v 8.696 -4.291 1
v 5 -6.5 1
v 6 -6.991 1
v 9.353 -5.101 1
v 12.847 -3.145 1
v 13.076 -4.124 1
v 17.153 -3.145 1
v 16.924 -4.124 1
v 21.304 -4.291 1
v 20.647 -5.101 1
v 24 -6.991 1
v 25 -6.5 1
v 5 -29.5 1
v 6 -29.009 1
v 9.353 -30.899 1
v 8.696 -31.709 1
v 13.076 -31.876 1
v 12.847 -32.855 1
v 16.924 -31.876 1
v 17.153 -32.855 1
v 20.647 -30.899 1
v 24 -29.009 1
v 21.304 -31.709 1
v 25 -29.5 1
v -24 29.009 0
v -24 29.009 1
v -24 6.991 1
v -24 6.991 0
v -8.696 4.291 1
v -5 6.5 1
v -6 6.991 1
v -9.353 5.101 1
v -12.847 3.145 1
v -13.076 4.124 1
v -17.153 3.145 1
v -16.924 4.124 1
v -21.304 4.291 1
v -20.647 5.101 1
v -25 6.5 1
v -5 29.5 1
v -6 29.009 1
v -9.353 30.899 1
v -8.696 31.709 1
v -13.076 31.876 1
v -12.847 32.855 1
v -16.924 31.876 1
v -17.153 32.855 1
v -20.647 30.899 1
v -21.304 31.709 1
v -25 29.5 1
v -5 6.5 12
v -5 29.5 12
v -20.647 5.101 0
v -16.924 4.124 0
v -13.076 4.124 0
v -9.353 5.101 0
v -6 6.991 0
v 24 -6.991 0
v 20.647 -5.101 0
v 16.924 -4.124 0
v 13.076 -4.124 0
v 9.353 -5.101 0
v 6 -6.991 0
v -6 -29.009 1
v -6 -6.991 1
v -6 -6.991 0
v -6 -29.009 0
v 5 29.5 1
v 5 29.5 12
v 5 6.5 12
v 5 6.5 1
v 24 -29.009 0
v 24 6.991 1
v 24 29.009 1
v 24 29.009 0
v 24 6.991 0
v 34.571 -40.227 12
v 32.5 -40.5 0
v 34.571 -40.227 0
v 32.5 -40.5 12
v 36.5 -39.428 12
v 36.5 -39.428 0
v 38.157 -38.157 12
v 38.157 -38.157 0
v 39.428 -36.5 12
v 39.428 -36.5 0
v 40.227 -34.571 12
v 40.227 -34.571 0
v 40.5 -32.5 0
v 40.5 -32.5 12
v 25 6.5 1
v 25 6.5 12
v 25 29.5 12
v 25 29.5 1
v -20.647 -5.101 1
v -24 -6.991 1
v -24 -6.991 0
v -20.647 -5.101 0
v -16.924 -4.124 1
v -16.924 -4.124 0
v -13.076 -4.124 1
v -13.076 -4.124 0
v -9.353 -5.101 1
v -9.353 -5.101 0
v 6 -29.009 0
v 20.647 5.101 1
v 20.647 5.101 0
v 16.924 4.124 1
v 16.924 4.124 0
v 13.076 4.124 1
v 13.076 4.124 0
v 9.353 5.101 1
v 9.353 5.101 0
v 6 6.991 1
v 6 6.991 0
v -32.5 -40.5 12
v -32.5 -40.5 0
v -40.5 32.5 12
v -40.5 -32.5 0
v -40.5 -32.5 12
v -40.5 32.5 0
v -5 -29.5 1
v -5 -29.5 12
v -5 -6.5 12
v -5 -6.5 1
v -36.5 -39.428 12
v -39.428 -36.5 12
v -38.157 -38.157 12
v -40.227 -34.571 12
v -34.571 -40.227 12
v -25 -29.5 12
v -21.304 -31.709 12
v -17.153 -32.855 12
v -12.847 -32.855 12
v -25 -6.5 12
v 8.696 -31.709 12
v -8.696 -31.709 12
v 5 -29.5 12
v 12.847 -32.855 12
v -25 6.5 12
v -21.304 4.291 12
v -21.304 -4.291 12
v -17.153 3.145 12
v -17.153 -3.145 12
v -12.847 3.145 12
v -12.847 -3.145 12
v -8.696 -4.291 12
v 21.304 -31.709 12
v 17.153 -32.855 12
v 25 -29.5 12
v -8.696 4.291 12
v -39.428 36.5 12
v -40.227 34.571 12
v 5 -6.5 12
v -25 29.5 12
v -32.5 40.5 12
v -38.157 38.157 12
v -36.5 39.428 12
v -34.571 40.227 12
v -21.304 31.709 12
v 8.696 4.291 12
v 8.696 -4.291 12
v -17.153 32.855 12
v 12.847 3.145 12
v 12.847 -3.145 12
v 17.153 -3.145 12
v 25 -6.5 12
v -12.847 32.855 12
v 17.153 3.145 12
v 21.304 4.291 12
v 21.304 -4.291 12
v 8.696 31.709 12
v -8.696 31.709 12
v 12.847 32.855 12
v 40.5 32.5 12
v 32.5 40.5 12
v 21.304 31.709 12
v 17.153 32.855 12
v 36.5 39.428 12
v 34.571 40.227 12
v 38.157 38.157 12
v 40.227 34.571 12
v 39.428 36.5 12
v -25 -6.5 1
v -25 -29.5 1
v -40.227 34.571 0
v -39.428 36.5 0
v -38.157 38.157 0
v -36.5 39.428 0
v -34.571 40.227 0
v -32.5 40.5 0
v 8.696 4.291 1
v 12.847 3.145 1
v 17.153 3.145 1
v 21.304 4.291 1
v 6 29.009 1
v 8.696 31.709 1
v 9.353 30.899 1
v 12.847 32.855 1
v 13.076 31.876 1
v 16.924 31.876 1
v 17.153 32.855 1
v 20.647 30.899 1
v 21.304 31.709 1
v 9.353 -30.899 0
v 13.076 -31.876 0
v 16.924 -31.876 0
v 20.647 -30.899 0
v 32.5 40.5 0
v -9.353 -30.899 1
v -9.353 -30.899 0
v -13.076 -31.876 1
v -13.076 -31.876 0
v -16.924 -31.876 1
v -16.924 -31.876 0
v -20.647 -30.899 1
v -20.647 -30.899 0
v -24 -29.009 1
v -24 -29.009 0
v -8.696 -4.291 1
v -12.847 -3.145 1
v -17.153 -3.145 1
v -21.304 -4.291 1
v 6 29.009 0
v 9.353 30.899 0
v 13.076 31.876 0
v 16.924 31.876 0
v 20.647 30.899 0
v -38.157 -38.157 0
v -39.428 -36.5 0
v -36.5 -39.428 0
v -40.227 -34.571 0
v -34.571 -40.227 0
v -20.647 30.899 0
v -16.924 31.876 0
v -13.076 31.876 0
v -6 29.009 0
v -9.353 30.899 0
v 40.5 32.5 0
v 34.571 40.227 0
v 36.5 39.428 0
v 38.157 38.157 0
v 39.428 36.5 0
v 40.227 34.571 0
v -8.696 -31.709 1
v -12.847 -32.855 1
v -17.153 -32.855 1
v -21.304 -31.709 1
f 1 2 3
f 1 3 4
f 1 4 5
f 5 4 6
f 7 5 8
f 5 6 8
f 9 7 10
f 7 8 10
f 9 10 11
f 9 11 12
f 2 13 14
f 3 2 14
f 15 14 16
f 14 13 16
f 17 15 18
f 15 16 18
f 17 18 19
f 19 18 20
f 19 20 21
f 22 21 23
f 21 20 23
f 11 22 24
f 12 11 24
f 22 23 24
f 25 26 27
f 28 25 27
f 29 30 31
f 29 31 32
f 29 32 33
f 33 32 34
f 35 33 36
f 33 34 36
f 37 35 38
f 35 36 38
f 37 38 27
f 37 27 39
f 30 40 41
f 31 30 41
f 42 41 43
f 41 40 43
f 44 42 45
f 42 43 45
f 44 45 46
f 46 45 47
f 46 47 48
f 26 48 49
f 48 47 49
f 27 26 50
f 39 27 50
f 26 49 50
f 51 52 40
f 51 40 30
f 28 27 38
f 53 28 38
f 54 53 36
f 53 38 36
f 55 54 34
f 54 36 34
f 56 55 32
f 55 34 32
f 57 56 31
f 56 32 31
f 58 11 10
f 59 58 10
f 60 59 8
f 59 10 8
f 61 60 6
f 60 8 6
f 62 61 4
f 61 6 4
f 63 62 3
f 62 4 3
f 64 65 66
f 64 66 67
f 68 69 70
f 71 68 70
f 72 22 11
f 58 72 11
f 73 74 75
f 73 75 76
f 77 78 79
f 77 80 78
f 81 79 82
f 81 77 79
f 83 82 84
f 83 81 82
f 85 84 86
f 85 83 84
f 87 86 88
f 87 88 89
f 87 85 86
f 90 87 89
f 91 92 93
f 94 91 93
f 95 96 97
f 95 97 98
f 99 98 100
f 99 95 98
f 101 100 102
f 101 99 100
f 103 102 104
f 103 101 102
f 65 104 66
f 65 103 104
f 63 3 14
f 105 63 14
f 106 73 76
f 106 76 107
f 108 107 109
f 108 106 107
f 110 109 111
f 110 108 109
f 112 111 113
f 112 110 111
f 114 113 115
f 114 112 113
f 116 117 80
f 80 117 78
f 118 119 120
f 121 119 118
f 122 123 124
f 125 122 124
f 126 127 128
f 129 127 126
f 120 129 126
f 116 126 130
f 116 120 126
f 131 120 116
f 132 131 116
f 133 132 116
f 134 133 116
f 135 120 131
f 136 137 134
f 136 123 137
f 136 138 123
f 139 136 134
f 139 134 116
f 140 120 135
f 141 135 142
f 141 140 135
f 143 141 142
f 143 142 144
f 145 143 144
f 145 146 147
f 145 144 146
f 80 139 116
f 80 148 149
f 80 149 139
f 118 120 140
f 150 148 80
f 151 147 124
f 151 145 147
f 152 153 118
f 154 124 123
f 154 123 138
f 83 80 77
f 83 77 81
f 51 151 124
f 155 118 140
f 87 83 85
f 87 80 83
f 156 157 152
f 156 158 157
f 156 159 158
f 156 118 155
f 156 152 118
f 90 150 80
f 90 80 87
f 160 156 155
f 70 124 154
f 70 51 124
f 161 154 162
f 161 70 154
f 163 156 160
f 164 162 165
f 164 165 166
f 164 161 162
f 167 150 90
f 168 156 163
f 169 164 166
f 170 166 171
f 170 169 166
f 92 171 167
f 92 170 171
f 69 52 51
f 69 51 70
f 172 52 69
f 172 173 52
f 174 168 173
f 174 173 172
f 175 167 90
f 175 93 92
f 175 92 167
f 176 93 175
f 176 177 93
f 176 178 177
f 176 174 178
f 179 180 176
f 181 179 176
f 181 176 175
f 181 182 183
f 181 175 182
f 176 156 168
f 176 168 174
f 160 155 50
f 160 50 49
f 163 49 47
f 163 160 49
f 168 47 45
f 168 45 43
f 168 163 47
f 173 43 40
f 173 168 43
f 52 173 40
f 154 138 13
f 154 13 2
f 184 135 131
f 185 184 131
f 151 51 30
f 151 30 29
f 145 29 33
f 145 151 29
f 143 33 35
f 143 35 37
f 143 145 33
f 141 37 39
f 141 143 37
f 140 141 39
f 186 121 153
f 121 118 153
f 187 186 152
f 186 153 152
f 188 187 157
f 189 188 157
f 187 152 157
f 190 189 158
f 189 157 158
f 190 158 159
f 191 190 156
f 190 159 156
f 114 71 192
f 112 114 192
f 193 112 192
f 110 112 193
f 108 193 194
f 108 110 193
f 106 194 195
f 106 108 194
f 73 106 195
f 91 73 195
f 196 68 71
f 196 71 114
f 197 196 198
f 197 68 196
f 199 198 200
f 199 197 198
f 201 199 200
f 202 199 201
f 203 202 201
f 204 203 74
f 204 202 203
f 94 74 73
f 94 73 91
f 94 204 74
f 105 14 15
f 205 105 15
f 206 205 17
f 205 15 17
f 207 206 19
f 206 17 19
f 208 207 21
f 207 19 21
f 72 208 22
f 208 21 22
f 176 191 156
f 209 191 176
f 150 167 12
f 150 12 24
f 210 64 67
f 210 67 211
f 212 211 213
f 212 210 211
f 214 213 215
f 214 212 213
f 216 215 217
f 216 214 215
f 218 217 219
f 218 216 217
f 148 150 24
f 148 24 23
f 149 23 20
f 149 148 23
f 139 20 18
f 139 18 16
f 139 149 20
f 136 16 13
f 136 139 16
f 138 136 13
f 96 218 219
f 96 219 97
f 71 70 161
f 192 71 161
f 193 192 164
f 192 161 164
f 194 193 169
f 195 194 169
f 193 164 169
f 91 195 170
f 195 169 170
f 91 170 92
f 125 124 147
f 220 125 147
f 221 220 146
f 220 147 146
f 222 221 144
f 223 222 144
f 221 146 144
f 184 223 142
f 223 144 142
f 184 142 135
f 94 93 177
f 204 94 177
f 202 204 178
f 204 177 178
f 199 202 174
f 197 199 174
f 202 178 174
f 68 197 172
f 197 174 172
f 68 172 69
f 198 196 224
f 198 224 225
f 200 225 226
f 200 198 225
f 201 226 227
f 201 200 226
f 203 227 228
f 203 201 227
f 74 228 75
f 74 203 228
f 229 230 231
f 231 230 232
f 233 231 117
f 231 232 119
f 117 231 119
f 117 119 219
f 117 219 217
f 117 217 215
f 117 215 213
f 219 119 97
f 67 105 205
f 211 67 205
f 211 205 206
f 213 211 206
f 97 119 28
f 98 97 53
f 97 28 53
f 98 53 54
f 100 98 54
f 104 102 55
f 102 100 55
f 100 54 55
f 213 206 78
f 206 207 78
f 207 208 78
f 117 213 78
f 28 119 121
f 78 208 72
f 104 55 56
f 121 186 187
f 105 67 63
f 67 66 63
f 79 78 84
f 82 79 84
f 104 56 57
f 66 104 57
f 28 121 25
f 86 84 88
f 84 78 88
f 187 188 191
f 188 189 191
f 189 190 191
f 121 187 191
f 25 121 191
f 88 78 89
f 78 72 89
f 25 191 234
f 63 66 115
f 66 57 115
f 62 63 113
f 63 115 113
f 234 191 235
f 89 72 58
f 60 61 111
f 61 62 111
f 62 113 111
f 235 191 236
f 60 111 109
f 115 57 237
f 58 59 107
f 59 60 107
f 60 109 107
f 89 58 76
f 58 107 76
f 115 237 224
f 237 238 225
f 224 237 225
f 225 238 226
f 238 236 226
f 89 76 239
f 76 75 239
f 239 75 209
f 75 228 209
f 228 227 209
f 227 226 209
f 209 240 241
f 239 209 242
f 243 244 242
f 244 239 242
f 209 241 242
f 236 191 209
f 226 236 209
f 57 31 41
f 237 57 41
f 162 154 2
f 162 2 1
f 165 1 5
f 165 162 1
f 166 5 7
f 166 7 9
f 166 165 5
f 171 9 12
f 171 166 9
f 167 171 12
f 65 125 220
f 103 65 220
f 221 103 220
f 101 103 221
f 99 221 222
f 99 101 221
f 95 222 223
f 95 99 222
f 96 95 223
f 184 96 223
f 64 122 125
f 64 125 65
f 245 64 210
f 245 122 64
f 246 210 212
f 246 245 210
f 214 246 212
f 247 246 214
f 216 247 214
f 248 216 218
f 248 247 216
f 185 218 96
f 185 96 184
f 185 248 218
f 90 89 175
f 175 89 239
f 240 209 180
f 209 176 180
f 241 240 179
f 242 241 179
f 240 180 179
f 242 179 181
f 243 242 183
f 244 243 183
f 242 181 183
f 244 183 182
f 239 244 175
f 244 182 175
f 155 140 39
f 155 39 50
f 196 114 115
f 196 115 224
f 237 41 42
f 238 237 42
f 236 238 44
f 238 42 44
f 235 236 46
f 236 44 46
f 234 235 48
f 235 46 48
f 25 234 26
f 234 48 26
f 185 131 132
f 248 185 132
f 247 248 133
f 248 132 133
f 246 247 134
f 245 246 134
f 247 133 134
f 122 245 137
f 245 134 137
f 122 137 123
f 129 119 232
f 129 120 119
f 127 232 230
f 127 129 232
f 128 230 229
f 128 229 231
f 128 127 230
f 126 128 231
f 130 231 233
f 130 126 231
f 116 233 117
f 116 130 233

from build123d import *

# Parameters (mm, degrees)
SKETCH1_W            = 81
SKETCH1_H            = 81
BOSS_EXTRUDE1_DEPTH  = 12
CUT_EXTRUDE1_DEPTH   = 11
CUT_EXTRUDE2_DEPTH   = 59.322379924
MIRROR3_COPY_1_DEPTH = 11
MIRROR3_COPY_2_DEPTH = 59.322379924
FILLET1_R            = 8


with BuildPart() as part:
    # Sketch1 → Boss-Extrude1 (new body)
    with BuildSketch(Plane.XY):
        Rectangle(SKETCH1_W, SKETCH1_H)
    extrude(amount=BOSS_EXTRUDE1_DEPTH)

    # Sketch2 → Cut-Extrude1 (cut)
    with BuildSketch(Plane.XY.offset(12)):
        with BuildLine():
            Line((-25, 6.5), (-25, 29.5))
            ThreePointArc((-25, 29.5), (-15, 33), (-5, 29.5))
            Line((-5, 29.5), (-5, 6.5))
            ThreePointArc((-5, 6.5), (-15, 3), (-25, 6.5))
        make_face()
    cut_extrude1 = extrude(amount=-CUT_EXTRUDE1_DEPTH, mode=Mode.SUBTRACT)

    # Sketch4 → Cut-Extrude2 (cut, through all)
    with BuildSketch(Plane.XY.offset(1)):
        with BuildLine():
            Line((-6, 6.991101213), (-6, 29.008898787))
            ThreePointArc((-6, 29.008898787), (-15, 32), (-24, 29.008898787))
            Line((-24, 29.008898787), (-24, 6.991101213))
            ThreePointArc((-24, 6.991101213), (-15, 4), (-6, 6.991101213))
        make_face()
    cut_extrude2 = extrude(amount=-CUT_EXTRUDE2_DEPTH, mode=Mode.SUBTRACT)

    # Mirror2: Cut-Extrude1, Cut-Extrude2 across plane
    add(cut_extrude1.mirror(Plane.ZX), mode=Mode.SUBTRACT)
    add(cut_extrude2.mirror(Plane.ZX), mode=Mode.SUBTRACT)

    # Mirror3: Cut-Extrude1, Cut-Extrude2 across plane
    add(cut_extrude1.mirror(Plane(origin=(0, 0, 0), x_dir=(0, 0, 1), z_dir=(1, 0, 0))), mode=Mode.SUBTRACT)
    add(cut_extrude2.mirror(Plane(origin=(0, 0, 0), x_dir=(0, 0, 1), z_dir=(1, 0, 0))), mode=Mode.SUBTRACT)

    # Mirror3 copy 1 sketch → Mirror3 copy 1 (cut)
    with BuildSketch(Plane(origin=(0, 0, 12), x_dir=(-1, 0, 0), z_dir=(0, 0, 1))):
        with BuildLine():
            Line((-25, 6.5), (-25, 29.5))
            ThreePointArc((-25, 29.5), (-15, 33), (-5, 29.5))
            Line((-5, 29.5), (-5, 6.5))
            ThreePointArc((-5, 6.5), (-15, 3), (-25, 6.5))
        make_face()
    extrude(amount=-MIRROR3_COPY_1_DEPTH, mode=Mode.SUBTRACT)

    # Mirror3 copy 2 sketch → Mirror3 copy 2 (cut, through all)
    with BuildSketch(Plane(origin=(0, 0, 1), x_dir=(-1, 0, 0), z_dir=(0, 0, 1))):
        with BuildLine():
            Line((-6, 6.991101213), (-6, 29.008898787))
            ThreePointArc((-6, 29.008898787), (-15, 32), (-24, 29.008898787))
            Line((-24, 29.008898787), (-24, 6.991101213))
            ThreePointArc((-24, 6.991101213), (-15, 4), (-6, 6.991101213))
        make_face()
    extrude(amount=-MIRROR3_COPY_2_DEPTH, mode=Mode.SUBTRACT)

    # Fillet1
    fillet1_edges = [part.edges().sort_by_distance(p)[0] for p in [
        (40.5, -40.5, 6),
        (-40.5, -40.5, 6),
        (-40.5, 40.5, 6),
        (40.5, 40.5, 6),
    ]]
    fillet(fillet1_edges, radius=FILLET1_R)


solid = part.part
